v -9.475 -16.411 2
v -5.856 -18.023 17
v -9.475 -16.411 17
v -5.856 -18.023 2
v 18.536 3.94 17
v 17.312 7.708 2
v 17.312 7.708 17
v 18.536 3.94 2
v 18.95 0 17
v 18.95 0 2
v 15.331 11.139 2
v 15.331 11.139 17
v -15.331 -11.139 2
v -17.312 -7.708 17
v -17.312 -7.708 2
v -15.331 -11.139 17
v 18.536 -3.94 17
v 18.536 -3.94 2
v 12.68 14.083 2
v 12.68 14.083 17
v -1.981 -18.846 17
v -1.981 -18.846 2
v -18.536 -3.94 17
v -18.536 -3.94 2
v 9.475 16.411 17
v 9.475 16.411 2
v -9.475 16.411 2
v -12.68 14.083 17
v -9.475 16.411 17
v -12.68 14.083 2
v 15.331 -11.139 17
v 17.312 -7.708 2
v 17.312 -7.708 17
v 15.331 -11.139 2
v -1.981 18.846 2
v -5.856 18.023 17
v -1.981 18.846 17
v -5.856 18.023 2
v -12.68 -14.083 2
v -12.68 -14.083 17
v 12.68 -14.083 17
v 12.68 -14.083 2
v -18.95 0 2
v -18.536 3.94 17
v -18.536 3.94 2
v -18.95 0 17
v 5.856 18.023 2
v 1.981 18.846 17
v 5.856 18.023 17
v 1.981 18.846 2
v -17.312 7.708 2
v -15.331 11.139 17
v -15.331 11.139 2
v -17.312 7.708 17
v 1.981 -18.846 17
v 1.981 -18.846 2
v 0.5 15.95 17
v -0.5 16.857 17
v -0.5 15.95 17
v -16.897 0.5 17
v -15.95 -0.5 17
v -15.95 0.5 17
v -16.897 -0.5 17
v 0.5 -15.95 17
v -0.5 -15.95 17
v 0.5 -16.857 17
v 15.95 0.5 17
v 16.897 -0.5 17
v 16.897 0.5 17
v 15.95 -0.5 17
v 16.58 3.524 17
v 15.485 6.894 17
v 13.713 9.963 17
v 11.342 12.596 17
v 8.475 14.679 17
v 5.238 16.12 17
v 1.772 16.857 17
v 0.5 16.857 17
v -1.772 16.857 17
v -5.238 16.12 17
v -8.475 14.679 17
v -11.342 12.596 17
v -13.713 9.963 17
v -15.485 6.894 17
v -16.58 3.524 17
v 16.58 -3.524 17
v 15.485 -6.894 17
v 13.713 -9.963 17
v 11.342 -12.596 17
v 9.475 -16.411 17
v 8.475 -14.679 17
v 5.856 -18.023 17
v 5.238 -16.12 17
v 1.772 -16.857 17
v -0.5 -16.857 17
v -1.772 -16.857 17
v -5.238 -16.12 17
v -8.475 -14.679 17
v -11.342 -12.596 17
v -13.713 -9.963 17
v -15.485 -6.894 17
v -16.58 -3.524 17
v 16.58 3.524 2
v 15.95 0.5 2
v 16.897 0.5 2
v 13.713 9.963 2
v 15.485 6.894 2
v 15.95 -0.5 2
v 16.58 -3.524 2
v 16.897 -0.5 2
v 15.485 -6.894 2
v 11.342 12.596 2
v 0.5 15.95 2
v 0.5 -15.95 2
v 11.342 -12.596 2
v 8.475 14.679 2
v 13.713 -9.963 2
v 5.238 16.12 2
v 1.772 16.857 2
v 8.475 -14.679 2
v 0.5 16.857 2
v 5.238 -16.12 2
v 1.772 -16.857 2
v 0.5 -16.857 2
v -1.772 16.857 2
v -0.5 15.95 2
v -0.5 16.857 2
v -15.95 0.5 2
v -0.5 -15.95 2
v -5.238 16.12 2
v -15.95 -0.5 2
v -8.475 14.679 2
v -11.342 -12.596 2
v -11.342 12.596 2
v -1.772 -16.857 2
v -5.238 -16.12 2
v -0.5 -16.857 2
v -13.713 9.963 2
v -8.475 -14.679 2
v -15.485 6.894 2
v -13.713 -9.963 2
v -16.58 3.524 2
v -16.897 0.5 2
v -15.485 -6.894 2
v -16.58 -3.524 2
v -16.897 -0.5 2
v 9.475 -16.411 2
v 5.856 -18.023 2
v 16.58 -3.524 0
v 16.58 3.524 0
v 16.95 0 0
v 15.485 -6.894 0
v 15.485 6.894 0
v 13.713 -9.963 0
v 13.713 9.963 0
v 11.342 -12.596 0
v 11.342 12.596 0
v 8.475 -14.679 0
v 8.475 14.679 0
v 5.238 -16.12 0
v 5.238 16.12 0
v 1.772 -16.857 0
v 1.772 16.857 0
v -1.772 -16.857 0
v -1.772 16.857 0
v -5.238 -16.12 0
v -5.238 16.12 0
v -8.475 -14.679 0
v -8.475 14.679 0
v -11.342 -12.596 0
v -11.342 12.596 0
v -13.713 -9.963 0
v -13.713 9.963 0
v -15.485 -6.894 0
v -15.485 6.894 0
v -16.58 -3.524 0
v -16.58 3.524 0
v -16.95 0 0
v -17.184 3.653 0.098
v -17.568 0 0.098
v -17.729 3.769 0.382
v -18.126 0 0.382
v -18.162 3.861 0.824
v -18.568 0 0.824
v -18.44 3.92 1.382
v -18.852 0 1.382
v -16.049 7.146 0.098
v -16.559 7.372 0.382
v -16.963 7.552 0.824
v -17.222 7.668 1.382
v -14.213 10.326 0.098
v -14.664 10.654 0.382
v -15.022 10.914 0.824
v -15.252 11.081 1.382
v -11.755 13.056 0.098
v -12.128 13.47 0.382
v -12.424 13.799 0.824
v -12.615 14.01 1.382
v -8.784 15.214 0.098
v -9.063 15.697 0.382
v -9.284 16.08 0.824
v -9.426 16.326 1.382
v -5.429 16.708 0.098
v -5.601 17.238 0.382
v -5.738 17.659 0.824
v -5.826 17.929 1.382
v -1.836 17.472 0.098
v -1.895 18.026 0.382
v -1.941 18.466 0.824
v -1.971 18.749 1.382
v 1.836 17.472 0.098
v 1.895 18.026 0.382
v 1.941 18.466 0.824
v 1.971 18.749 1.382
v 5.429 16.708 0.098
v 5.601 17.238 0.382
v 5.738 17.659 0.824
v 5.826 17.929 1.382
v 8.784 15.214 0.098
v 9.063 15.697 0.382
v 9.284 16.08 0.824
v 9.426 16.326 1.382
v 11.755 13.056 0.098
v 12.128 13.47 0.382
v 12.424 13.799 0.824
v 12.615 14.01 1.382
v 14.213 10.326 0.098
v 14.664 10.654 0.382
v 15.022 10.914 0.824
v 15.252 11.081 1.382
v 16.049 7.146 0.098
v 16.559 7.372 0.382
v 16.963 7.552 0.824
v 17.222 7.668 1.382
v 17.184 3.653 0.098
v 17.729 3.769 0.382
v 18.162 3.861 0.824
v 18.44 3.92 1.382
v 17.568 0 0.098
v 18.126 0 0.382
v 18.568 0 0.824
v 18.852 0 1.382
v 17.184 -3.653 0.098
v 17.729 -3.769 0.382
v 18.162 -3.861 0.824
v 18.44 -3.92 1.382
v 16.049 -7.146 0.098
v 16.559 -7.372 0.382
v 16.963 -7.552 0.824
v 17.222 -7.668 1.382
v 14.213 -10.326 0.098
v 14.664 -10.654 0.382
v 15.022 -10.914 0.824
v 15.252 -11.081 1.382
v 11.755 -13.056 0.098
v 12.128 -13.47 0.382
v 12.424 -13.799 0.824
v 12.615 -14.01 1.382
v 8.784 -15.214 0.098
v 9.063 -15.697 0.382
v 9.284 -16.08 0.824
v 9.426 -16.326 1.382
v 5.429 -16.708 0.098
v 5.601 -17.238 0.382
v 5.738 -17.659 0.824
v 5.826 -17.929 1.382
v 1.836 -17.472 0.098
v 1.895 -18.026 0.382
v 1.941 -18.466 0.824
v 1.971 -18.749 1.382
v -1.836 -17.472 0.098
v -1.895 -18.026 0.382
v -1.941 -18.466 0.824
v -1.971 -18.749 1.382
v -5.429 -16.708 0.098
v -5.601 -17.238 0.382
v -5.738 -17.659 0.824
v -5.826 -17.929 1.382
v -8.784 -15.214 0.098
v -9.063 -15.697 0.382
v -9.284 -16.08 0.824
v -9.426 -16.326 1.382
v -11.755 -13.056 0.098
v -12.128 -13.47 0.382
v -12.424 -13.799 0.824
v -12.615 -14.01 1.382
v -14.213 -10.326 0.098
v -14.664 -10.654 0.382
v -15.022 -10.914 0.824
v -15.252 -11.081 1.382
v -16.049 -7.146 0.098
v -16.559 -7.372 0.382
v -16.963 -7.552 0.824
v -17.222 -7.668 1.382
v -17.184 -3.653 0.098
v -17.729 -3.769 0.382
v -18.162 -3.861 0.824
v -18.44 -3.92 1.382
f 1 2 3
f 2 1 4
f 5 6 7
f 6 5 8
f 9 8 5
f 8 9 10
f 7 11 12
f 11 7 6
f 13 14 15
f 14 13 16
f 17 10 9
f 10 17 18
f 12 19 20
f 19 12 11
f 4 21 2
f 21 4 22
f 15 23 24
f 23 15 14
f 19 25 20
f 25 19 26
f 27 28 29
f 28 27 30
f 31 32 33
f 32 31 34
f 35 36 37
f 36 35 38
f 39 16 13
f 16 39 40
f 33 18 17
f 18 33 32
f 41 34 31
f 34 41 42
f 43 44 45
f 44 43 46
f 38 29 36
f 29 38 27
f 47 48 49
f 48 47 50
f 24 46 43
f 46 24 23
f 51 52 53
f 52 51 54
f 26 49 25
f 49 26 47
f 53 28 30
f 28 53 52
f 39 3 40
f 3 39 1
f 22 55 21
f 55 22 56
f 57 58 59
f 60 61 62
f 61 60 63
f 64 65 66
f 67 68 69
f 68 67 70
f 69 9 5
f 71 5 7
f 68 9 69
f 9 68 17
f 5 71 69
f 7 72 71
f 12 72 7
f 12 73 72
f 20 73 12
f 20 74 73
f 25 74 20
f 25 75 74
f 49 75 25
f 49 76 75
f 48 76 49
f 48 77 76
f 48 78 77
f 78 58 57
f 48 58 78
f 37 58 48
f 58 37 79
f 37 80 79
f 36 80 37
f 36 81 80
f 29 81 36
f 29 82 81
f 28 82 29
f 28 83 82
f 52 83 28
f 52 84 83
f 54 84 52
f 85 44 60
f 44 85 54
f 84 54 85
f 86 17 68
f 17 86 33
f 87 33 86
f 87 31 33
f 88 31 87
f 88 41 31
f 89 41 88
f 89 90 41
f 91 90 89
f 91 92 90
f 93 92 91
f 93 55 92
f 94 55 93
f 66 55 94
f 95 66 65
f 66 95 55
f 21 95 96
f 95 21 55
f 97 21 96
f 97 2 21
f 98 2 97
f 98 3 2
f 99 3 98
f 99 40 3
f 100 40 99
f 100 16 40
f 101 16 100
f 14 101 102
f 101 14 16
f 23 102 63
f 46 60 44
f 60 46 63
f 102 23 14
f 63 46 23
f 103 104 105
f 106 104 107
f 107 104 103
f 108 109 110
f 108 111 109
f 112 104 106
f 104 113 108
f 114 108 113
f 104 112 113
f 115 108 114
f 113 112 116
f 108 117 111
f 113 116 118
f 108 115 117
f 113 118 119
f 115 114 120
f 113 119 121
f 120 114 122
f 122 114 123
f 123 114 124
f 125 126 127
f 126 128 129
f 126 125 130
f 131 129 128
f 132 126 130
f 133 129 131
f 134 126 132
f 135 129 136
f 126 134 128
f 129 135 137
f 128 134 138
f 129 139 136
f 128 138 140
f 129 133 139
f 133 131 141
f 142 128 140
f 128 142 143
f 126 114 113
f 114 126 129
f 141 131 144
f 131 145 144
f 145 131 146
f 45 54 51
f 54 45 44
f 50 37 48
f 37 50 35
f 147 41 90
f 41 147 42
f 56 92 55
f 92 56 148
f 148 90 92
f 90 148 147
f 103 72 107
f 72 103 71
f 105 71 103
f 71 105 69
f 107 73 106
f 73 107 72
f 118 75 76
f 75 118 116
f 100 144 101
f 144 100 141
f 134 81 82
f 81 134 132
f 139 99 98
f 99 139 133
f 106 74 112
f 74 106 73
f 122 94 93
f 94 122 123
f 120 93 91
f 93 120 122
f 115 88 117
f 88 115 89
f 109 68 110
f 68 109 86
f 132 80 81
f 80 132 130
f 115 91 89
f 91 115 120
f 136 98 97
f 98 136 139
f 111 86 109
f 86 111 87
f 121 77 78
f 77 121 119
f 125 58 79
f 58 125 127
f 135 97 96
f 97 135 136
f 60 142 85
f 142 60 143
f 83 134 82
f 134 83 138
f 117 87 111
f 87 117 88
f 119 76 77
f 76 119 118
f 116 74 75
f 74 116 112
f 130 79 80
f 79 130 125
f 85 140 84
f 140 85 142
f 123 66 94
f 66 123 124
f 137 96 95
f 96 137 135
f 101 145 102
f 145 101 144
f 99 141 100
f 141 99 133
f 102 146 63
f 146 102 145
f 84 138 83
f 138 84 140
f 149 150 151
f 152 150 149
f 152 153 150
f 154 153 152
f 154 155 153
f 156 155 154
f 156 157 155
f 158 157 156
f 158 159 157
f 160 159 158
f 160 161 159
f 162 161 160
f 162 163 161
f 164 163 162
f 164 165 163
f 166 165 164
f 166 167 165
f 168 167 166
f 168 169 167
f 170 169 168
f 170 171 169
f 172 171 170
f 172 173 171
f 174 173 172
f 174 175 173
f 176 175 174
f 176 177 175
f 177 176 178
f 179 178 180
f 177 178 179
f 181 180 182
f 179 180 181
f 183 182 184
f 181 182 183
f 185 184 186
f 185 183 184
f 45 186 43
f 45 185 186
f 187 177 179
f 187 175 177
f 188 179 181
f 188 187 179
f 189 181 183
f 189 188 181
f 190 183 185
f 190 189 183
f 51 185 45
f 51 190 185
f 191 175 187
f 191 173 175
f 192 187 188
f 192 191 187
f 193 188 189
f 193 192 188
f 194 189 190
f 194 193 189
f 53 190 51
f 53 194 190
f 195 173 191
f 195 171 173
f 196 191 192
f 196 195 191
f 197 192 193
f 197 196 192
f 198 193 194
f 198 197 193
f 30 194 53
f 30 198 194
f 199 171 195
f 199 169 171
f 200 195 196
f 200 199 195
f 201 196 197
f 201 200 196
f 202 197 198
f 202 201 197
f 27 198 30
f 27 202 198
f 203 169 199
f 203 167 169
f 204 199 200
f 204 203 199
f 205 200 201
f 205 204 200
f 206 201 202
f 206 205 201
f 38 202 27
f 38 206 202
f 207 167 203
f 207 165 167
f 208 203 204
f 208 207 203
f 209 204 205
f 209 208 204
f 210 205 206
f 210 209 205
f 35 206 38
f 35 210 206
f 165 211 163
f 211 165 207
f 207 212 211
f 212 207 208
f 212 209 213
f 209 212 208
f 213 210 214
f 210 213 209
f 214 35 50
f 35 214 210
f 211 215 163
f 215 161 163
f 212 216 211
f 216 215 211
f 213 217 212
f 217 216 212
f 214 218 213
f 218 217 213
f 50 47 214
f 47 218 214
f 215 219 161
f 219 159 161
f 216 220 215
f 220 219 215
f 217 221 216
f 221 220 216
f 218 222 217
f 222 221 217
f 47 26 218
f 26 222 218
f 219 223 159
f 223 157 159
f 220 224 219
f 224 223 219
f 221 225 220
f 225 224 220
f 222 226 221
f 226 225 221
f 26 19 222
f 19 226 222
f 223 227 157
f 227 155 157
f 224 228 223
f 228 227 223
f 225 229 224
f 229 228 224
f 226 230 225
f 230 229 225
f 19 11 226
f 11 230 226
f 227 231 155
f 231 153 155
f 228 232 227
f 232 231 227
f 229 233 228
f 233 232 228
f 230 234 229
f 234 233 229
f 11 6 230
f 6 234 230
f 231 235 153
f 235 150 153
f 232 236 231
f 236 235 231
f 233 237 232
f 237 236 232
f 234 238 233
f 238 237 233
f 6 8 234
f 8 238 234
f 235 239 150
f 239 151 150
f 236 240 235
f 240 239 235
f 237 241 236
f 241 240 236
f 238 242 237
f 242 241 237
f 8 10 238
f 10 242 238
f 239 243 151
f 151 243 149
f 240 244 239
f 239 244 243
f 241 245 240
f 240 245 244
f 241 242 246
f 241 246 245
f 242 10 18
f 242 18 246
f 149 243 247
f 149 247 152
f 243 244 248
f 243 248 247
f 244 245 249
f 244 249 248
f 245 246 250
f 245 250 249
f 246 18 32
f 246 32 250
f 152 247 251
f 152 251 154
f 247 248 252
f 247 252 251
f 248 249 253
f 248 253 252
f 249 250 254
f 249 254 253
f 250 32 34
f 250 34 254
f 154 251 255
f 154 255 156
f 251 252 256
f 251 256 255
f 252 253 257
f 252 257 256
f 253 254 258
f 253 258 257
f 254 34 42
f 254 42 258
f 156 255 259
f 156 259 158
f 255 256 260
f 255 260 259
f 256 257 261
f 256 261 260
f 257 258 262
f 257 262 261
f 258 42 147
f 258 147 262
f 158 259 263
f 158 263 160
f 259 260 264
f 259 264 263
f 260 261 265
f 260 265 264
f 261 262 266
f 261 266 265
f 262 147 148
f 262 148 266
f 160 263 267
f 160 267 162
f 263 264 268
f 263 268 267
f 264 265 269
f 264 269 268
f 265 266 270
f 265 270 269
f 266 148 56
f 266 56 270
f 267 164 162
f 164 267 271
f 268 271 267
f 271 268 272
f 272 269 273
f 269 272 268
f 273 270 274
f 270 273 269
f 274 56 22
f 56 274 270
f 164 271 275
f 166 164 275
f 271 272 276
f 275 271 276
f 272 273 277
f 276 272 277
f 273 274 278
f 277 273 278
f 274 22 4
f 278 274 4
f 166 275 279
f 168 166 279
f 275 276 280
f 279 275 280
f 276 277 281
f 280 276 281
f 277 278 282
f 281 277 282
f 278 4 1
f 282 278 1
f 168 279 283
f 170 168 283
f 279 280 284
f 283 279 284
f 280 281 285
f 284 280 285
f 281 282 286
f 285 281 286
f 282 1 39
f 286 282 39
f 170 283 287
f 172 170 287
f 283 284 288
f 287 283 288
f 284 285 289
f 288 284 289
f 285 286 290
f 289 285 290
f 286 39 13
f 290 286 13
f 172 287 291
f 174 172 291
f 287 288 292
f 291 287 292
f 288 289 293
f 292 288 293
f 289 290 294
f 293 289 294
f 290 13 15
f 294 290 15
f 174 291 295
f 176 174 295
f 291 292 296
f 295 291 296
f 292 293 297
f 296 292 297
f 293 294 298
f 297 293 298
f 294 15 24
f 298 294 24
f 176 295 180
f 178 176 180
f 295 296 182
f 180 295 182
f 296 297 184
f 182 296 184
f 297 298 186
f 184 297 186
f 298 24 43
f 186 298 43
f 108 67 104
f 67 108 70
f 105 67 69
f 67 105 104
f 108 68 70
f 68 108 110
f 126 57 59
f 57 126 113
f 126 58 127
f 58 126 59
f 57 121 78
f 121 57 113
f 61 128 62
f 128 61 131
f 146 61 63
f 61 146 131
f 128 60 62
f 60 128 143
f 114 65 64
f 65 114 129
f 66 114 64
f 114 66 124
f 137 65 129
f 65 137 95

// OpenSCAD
// Parametric cap.
// Author: Fabrice Fleurot

Th = 2;   // Thickness
Hi = 15;   // Internal height.
Di = 31.7;   // Internal Diameter.
W = 1;  // Width of ribs.
VentHoleRadius = 0; // 0.5  // Use it if no ribs (W=0) and/or gap too small: you'll need a way for air to escape.

gap = 0.1;   // Gap between cap and eyepiece, reduce if loose, increase if tight.
RoundedEdges = true;




// Other variables, don't touch:
Ri = Di/2;  // Internal radius.
e = .2;  // Epsilon for subtraction.


// Cylindrical part.
translate([0,0,Th])
difference()
{
    cylinder(r = Ri+gap+W+Th, h = Hi);  // Outer
    translate([0,0,-e]) cylinder(r = Ri+gap+W, h=Hi+2*e);
}

// Cylinder end.
Re = RoundedEdges? Ri+W+gap : Ri+W+gap+Th;
difference()
{
    cylinder(r = Re, h = Th);
    translate([0,0,-e]) cylinder(r=VentHoleRadius, h=Th+2*e);
}

// Rounded edge if needed.
if(RoundedEdges)
{
    translate([0,0,Th])
    difference()
    {
        rotate_extrude(convexity=10)
            translate([Ri+gap+W,0,0])
                circle(r=Th, $fn=20);
        cylinder(r = Ri+gap+W+e, h = Th+e);
    }
}


// Ribs
if(W>0)
{
    for(i=[0:3])
    {
        rotate([0,0,90*i])
            translate([Ri+gap,-W/2,Th])
                cube([W+e, W, Hi]);
    }
}
